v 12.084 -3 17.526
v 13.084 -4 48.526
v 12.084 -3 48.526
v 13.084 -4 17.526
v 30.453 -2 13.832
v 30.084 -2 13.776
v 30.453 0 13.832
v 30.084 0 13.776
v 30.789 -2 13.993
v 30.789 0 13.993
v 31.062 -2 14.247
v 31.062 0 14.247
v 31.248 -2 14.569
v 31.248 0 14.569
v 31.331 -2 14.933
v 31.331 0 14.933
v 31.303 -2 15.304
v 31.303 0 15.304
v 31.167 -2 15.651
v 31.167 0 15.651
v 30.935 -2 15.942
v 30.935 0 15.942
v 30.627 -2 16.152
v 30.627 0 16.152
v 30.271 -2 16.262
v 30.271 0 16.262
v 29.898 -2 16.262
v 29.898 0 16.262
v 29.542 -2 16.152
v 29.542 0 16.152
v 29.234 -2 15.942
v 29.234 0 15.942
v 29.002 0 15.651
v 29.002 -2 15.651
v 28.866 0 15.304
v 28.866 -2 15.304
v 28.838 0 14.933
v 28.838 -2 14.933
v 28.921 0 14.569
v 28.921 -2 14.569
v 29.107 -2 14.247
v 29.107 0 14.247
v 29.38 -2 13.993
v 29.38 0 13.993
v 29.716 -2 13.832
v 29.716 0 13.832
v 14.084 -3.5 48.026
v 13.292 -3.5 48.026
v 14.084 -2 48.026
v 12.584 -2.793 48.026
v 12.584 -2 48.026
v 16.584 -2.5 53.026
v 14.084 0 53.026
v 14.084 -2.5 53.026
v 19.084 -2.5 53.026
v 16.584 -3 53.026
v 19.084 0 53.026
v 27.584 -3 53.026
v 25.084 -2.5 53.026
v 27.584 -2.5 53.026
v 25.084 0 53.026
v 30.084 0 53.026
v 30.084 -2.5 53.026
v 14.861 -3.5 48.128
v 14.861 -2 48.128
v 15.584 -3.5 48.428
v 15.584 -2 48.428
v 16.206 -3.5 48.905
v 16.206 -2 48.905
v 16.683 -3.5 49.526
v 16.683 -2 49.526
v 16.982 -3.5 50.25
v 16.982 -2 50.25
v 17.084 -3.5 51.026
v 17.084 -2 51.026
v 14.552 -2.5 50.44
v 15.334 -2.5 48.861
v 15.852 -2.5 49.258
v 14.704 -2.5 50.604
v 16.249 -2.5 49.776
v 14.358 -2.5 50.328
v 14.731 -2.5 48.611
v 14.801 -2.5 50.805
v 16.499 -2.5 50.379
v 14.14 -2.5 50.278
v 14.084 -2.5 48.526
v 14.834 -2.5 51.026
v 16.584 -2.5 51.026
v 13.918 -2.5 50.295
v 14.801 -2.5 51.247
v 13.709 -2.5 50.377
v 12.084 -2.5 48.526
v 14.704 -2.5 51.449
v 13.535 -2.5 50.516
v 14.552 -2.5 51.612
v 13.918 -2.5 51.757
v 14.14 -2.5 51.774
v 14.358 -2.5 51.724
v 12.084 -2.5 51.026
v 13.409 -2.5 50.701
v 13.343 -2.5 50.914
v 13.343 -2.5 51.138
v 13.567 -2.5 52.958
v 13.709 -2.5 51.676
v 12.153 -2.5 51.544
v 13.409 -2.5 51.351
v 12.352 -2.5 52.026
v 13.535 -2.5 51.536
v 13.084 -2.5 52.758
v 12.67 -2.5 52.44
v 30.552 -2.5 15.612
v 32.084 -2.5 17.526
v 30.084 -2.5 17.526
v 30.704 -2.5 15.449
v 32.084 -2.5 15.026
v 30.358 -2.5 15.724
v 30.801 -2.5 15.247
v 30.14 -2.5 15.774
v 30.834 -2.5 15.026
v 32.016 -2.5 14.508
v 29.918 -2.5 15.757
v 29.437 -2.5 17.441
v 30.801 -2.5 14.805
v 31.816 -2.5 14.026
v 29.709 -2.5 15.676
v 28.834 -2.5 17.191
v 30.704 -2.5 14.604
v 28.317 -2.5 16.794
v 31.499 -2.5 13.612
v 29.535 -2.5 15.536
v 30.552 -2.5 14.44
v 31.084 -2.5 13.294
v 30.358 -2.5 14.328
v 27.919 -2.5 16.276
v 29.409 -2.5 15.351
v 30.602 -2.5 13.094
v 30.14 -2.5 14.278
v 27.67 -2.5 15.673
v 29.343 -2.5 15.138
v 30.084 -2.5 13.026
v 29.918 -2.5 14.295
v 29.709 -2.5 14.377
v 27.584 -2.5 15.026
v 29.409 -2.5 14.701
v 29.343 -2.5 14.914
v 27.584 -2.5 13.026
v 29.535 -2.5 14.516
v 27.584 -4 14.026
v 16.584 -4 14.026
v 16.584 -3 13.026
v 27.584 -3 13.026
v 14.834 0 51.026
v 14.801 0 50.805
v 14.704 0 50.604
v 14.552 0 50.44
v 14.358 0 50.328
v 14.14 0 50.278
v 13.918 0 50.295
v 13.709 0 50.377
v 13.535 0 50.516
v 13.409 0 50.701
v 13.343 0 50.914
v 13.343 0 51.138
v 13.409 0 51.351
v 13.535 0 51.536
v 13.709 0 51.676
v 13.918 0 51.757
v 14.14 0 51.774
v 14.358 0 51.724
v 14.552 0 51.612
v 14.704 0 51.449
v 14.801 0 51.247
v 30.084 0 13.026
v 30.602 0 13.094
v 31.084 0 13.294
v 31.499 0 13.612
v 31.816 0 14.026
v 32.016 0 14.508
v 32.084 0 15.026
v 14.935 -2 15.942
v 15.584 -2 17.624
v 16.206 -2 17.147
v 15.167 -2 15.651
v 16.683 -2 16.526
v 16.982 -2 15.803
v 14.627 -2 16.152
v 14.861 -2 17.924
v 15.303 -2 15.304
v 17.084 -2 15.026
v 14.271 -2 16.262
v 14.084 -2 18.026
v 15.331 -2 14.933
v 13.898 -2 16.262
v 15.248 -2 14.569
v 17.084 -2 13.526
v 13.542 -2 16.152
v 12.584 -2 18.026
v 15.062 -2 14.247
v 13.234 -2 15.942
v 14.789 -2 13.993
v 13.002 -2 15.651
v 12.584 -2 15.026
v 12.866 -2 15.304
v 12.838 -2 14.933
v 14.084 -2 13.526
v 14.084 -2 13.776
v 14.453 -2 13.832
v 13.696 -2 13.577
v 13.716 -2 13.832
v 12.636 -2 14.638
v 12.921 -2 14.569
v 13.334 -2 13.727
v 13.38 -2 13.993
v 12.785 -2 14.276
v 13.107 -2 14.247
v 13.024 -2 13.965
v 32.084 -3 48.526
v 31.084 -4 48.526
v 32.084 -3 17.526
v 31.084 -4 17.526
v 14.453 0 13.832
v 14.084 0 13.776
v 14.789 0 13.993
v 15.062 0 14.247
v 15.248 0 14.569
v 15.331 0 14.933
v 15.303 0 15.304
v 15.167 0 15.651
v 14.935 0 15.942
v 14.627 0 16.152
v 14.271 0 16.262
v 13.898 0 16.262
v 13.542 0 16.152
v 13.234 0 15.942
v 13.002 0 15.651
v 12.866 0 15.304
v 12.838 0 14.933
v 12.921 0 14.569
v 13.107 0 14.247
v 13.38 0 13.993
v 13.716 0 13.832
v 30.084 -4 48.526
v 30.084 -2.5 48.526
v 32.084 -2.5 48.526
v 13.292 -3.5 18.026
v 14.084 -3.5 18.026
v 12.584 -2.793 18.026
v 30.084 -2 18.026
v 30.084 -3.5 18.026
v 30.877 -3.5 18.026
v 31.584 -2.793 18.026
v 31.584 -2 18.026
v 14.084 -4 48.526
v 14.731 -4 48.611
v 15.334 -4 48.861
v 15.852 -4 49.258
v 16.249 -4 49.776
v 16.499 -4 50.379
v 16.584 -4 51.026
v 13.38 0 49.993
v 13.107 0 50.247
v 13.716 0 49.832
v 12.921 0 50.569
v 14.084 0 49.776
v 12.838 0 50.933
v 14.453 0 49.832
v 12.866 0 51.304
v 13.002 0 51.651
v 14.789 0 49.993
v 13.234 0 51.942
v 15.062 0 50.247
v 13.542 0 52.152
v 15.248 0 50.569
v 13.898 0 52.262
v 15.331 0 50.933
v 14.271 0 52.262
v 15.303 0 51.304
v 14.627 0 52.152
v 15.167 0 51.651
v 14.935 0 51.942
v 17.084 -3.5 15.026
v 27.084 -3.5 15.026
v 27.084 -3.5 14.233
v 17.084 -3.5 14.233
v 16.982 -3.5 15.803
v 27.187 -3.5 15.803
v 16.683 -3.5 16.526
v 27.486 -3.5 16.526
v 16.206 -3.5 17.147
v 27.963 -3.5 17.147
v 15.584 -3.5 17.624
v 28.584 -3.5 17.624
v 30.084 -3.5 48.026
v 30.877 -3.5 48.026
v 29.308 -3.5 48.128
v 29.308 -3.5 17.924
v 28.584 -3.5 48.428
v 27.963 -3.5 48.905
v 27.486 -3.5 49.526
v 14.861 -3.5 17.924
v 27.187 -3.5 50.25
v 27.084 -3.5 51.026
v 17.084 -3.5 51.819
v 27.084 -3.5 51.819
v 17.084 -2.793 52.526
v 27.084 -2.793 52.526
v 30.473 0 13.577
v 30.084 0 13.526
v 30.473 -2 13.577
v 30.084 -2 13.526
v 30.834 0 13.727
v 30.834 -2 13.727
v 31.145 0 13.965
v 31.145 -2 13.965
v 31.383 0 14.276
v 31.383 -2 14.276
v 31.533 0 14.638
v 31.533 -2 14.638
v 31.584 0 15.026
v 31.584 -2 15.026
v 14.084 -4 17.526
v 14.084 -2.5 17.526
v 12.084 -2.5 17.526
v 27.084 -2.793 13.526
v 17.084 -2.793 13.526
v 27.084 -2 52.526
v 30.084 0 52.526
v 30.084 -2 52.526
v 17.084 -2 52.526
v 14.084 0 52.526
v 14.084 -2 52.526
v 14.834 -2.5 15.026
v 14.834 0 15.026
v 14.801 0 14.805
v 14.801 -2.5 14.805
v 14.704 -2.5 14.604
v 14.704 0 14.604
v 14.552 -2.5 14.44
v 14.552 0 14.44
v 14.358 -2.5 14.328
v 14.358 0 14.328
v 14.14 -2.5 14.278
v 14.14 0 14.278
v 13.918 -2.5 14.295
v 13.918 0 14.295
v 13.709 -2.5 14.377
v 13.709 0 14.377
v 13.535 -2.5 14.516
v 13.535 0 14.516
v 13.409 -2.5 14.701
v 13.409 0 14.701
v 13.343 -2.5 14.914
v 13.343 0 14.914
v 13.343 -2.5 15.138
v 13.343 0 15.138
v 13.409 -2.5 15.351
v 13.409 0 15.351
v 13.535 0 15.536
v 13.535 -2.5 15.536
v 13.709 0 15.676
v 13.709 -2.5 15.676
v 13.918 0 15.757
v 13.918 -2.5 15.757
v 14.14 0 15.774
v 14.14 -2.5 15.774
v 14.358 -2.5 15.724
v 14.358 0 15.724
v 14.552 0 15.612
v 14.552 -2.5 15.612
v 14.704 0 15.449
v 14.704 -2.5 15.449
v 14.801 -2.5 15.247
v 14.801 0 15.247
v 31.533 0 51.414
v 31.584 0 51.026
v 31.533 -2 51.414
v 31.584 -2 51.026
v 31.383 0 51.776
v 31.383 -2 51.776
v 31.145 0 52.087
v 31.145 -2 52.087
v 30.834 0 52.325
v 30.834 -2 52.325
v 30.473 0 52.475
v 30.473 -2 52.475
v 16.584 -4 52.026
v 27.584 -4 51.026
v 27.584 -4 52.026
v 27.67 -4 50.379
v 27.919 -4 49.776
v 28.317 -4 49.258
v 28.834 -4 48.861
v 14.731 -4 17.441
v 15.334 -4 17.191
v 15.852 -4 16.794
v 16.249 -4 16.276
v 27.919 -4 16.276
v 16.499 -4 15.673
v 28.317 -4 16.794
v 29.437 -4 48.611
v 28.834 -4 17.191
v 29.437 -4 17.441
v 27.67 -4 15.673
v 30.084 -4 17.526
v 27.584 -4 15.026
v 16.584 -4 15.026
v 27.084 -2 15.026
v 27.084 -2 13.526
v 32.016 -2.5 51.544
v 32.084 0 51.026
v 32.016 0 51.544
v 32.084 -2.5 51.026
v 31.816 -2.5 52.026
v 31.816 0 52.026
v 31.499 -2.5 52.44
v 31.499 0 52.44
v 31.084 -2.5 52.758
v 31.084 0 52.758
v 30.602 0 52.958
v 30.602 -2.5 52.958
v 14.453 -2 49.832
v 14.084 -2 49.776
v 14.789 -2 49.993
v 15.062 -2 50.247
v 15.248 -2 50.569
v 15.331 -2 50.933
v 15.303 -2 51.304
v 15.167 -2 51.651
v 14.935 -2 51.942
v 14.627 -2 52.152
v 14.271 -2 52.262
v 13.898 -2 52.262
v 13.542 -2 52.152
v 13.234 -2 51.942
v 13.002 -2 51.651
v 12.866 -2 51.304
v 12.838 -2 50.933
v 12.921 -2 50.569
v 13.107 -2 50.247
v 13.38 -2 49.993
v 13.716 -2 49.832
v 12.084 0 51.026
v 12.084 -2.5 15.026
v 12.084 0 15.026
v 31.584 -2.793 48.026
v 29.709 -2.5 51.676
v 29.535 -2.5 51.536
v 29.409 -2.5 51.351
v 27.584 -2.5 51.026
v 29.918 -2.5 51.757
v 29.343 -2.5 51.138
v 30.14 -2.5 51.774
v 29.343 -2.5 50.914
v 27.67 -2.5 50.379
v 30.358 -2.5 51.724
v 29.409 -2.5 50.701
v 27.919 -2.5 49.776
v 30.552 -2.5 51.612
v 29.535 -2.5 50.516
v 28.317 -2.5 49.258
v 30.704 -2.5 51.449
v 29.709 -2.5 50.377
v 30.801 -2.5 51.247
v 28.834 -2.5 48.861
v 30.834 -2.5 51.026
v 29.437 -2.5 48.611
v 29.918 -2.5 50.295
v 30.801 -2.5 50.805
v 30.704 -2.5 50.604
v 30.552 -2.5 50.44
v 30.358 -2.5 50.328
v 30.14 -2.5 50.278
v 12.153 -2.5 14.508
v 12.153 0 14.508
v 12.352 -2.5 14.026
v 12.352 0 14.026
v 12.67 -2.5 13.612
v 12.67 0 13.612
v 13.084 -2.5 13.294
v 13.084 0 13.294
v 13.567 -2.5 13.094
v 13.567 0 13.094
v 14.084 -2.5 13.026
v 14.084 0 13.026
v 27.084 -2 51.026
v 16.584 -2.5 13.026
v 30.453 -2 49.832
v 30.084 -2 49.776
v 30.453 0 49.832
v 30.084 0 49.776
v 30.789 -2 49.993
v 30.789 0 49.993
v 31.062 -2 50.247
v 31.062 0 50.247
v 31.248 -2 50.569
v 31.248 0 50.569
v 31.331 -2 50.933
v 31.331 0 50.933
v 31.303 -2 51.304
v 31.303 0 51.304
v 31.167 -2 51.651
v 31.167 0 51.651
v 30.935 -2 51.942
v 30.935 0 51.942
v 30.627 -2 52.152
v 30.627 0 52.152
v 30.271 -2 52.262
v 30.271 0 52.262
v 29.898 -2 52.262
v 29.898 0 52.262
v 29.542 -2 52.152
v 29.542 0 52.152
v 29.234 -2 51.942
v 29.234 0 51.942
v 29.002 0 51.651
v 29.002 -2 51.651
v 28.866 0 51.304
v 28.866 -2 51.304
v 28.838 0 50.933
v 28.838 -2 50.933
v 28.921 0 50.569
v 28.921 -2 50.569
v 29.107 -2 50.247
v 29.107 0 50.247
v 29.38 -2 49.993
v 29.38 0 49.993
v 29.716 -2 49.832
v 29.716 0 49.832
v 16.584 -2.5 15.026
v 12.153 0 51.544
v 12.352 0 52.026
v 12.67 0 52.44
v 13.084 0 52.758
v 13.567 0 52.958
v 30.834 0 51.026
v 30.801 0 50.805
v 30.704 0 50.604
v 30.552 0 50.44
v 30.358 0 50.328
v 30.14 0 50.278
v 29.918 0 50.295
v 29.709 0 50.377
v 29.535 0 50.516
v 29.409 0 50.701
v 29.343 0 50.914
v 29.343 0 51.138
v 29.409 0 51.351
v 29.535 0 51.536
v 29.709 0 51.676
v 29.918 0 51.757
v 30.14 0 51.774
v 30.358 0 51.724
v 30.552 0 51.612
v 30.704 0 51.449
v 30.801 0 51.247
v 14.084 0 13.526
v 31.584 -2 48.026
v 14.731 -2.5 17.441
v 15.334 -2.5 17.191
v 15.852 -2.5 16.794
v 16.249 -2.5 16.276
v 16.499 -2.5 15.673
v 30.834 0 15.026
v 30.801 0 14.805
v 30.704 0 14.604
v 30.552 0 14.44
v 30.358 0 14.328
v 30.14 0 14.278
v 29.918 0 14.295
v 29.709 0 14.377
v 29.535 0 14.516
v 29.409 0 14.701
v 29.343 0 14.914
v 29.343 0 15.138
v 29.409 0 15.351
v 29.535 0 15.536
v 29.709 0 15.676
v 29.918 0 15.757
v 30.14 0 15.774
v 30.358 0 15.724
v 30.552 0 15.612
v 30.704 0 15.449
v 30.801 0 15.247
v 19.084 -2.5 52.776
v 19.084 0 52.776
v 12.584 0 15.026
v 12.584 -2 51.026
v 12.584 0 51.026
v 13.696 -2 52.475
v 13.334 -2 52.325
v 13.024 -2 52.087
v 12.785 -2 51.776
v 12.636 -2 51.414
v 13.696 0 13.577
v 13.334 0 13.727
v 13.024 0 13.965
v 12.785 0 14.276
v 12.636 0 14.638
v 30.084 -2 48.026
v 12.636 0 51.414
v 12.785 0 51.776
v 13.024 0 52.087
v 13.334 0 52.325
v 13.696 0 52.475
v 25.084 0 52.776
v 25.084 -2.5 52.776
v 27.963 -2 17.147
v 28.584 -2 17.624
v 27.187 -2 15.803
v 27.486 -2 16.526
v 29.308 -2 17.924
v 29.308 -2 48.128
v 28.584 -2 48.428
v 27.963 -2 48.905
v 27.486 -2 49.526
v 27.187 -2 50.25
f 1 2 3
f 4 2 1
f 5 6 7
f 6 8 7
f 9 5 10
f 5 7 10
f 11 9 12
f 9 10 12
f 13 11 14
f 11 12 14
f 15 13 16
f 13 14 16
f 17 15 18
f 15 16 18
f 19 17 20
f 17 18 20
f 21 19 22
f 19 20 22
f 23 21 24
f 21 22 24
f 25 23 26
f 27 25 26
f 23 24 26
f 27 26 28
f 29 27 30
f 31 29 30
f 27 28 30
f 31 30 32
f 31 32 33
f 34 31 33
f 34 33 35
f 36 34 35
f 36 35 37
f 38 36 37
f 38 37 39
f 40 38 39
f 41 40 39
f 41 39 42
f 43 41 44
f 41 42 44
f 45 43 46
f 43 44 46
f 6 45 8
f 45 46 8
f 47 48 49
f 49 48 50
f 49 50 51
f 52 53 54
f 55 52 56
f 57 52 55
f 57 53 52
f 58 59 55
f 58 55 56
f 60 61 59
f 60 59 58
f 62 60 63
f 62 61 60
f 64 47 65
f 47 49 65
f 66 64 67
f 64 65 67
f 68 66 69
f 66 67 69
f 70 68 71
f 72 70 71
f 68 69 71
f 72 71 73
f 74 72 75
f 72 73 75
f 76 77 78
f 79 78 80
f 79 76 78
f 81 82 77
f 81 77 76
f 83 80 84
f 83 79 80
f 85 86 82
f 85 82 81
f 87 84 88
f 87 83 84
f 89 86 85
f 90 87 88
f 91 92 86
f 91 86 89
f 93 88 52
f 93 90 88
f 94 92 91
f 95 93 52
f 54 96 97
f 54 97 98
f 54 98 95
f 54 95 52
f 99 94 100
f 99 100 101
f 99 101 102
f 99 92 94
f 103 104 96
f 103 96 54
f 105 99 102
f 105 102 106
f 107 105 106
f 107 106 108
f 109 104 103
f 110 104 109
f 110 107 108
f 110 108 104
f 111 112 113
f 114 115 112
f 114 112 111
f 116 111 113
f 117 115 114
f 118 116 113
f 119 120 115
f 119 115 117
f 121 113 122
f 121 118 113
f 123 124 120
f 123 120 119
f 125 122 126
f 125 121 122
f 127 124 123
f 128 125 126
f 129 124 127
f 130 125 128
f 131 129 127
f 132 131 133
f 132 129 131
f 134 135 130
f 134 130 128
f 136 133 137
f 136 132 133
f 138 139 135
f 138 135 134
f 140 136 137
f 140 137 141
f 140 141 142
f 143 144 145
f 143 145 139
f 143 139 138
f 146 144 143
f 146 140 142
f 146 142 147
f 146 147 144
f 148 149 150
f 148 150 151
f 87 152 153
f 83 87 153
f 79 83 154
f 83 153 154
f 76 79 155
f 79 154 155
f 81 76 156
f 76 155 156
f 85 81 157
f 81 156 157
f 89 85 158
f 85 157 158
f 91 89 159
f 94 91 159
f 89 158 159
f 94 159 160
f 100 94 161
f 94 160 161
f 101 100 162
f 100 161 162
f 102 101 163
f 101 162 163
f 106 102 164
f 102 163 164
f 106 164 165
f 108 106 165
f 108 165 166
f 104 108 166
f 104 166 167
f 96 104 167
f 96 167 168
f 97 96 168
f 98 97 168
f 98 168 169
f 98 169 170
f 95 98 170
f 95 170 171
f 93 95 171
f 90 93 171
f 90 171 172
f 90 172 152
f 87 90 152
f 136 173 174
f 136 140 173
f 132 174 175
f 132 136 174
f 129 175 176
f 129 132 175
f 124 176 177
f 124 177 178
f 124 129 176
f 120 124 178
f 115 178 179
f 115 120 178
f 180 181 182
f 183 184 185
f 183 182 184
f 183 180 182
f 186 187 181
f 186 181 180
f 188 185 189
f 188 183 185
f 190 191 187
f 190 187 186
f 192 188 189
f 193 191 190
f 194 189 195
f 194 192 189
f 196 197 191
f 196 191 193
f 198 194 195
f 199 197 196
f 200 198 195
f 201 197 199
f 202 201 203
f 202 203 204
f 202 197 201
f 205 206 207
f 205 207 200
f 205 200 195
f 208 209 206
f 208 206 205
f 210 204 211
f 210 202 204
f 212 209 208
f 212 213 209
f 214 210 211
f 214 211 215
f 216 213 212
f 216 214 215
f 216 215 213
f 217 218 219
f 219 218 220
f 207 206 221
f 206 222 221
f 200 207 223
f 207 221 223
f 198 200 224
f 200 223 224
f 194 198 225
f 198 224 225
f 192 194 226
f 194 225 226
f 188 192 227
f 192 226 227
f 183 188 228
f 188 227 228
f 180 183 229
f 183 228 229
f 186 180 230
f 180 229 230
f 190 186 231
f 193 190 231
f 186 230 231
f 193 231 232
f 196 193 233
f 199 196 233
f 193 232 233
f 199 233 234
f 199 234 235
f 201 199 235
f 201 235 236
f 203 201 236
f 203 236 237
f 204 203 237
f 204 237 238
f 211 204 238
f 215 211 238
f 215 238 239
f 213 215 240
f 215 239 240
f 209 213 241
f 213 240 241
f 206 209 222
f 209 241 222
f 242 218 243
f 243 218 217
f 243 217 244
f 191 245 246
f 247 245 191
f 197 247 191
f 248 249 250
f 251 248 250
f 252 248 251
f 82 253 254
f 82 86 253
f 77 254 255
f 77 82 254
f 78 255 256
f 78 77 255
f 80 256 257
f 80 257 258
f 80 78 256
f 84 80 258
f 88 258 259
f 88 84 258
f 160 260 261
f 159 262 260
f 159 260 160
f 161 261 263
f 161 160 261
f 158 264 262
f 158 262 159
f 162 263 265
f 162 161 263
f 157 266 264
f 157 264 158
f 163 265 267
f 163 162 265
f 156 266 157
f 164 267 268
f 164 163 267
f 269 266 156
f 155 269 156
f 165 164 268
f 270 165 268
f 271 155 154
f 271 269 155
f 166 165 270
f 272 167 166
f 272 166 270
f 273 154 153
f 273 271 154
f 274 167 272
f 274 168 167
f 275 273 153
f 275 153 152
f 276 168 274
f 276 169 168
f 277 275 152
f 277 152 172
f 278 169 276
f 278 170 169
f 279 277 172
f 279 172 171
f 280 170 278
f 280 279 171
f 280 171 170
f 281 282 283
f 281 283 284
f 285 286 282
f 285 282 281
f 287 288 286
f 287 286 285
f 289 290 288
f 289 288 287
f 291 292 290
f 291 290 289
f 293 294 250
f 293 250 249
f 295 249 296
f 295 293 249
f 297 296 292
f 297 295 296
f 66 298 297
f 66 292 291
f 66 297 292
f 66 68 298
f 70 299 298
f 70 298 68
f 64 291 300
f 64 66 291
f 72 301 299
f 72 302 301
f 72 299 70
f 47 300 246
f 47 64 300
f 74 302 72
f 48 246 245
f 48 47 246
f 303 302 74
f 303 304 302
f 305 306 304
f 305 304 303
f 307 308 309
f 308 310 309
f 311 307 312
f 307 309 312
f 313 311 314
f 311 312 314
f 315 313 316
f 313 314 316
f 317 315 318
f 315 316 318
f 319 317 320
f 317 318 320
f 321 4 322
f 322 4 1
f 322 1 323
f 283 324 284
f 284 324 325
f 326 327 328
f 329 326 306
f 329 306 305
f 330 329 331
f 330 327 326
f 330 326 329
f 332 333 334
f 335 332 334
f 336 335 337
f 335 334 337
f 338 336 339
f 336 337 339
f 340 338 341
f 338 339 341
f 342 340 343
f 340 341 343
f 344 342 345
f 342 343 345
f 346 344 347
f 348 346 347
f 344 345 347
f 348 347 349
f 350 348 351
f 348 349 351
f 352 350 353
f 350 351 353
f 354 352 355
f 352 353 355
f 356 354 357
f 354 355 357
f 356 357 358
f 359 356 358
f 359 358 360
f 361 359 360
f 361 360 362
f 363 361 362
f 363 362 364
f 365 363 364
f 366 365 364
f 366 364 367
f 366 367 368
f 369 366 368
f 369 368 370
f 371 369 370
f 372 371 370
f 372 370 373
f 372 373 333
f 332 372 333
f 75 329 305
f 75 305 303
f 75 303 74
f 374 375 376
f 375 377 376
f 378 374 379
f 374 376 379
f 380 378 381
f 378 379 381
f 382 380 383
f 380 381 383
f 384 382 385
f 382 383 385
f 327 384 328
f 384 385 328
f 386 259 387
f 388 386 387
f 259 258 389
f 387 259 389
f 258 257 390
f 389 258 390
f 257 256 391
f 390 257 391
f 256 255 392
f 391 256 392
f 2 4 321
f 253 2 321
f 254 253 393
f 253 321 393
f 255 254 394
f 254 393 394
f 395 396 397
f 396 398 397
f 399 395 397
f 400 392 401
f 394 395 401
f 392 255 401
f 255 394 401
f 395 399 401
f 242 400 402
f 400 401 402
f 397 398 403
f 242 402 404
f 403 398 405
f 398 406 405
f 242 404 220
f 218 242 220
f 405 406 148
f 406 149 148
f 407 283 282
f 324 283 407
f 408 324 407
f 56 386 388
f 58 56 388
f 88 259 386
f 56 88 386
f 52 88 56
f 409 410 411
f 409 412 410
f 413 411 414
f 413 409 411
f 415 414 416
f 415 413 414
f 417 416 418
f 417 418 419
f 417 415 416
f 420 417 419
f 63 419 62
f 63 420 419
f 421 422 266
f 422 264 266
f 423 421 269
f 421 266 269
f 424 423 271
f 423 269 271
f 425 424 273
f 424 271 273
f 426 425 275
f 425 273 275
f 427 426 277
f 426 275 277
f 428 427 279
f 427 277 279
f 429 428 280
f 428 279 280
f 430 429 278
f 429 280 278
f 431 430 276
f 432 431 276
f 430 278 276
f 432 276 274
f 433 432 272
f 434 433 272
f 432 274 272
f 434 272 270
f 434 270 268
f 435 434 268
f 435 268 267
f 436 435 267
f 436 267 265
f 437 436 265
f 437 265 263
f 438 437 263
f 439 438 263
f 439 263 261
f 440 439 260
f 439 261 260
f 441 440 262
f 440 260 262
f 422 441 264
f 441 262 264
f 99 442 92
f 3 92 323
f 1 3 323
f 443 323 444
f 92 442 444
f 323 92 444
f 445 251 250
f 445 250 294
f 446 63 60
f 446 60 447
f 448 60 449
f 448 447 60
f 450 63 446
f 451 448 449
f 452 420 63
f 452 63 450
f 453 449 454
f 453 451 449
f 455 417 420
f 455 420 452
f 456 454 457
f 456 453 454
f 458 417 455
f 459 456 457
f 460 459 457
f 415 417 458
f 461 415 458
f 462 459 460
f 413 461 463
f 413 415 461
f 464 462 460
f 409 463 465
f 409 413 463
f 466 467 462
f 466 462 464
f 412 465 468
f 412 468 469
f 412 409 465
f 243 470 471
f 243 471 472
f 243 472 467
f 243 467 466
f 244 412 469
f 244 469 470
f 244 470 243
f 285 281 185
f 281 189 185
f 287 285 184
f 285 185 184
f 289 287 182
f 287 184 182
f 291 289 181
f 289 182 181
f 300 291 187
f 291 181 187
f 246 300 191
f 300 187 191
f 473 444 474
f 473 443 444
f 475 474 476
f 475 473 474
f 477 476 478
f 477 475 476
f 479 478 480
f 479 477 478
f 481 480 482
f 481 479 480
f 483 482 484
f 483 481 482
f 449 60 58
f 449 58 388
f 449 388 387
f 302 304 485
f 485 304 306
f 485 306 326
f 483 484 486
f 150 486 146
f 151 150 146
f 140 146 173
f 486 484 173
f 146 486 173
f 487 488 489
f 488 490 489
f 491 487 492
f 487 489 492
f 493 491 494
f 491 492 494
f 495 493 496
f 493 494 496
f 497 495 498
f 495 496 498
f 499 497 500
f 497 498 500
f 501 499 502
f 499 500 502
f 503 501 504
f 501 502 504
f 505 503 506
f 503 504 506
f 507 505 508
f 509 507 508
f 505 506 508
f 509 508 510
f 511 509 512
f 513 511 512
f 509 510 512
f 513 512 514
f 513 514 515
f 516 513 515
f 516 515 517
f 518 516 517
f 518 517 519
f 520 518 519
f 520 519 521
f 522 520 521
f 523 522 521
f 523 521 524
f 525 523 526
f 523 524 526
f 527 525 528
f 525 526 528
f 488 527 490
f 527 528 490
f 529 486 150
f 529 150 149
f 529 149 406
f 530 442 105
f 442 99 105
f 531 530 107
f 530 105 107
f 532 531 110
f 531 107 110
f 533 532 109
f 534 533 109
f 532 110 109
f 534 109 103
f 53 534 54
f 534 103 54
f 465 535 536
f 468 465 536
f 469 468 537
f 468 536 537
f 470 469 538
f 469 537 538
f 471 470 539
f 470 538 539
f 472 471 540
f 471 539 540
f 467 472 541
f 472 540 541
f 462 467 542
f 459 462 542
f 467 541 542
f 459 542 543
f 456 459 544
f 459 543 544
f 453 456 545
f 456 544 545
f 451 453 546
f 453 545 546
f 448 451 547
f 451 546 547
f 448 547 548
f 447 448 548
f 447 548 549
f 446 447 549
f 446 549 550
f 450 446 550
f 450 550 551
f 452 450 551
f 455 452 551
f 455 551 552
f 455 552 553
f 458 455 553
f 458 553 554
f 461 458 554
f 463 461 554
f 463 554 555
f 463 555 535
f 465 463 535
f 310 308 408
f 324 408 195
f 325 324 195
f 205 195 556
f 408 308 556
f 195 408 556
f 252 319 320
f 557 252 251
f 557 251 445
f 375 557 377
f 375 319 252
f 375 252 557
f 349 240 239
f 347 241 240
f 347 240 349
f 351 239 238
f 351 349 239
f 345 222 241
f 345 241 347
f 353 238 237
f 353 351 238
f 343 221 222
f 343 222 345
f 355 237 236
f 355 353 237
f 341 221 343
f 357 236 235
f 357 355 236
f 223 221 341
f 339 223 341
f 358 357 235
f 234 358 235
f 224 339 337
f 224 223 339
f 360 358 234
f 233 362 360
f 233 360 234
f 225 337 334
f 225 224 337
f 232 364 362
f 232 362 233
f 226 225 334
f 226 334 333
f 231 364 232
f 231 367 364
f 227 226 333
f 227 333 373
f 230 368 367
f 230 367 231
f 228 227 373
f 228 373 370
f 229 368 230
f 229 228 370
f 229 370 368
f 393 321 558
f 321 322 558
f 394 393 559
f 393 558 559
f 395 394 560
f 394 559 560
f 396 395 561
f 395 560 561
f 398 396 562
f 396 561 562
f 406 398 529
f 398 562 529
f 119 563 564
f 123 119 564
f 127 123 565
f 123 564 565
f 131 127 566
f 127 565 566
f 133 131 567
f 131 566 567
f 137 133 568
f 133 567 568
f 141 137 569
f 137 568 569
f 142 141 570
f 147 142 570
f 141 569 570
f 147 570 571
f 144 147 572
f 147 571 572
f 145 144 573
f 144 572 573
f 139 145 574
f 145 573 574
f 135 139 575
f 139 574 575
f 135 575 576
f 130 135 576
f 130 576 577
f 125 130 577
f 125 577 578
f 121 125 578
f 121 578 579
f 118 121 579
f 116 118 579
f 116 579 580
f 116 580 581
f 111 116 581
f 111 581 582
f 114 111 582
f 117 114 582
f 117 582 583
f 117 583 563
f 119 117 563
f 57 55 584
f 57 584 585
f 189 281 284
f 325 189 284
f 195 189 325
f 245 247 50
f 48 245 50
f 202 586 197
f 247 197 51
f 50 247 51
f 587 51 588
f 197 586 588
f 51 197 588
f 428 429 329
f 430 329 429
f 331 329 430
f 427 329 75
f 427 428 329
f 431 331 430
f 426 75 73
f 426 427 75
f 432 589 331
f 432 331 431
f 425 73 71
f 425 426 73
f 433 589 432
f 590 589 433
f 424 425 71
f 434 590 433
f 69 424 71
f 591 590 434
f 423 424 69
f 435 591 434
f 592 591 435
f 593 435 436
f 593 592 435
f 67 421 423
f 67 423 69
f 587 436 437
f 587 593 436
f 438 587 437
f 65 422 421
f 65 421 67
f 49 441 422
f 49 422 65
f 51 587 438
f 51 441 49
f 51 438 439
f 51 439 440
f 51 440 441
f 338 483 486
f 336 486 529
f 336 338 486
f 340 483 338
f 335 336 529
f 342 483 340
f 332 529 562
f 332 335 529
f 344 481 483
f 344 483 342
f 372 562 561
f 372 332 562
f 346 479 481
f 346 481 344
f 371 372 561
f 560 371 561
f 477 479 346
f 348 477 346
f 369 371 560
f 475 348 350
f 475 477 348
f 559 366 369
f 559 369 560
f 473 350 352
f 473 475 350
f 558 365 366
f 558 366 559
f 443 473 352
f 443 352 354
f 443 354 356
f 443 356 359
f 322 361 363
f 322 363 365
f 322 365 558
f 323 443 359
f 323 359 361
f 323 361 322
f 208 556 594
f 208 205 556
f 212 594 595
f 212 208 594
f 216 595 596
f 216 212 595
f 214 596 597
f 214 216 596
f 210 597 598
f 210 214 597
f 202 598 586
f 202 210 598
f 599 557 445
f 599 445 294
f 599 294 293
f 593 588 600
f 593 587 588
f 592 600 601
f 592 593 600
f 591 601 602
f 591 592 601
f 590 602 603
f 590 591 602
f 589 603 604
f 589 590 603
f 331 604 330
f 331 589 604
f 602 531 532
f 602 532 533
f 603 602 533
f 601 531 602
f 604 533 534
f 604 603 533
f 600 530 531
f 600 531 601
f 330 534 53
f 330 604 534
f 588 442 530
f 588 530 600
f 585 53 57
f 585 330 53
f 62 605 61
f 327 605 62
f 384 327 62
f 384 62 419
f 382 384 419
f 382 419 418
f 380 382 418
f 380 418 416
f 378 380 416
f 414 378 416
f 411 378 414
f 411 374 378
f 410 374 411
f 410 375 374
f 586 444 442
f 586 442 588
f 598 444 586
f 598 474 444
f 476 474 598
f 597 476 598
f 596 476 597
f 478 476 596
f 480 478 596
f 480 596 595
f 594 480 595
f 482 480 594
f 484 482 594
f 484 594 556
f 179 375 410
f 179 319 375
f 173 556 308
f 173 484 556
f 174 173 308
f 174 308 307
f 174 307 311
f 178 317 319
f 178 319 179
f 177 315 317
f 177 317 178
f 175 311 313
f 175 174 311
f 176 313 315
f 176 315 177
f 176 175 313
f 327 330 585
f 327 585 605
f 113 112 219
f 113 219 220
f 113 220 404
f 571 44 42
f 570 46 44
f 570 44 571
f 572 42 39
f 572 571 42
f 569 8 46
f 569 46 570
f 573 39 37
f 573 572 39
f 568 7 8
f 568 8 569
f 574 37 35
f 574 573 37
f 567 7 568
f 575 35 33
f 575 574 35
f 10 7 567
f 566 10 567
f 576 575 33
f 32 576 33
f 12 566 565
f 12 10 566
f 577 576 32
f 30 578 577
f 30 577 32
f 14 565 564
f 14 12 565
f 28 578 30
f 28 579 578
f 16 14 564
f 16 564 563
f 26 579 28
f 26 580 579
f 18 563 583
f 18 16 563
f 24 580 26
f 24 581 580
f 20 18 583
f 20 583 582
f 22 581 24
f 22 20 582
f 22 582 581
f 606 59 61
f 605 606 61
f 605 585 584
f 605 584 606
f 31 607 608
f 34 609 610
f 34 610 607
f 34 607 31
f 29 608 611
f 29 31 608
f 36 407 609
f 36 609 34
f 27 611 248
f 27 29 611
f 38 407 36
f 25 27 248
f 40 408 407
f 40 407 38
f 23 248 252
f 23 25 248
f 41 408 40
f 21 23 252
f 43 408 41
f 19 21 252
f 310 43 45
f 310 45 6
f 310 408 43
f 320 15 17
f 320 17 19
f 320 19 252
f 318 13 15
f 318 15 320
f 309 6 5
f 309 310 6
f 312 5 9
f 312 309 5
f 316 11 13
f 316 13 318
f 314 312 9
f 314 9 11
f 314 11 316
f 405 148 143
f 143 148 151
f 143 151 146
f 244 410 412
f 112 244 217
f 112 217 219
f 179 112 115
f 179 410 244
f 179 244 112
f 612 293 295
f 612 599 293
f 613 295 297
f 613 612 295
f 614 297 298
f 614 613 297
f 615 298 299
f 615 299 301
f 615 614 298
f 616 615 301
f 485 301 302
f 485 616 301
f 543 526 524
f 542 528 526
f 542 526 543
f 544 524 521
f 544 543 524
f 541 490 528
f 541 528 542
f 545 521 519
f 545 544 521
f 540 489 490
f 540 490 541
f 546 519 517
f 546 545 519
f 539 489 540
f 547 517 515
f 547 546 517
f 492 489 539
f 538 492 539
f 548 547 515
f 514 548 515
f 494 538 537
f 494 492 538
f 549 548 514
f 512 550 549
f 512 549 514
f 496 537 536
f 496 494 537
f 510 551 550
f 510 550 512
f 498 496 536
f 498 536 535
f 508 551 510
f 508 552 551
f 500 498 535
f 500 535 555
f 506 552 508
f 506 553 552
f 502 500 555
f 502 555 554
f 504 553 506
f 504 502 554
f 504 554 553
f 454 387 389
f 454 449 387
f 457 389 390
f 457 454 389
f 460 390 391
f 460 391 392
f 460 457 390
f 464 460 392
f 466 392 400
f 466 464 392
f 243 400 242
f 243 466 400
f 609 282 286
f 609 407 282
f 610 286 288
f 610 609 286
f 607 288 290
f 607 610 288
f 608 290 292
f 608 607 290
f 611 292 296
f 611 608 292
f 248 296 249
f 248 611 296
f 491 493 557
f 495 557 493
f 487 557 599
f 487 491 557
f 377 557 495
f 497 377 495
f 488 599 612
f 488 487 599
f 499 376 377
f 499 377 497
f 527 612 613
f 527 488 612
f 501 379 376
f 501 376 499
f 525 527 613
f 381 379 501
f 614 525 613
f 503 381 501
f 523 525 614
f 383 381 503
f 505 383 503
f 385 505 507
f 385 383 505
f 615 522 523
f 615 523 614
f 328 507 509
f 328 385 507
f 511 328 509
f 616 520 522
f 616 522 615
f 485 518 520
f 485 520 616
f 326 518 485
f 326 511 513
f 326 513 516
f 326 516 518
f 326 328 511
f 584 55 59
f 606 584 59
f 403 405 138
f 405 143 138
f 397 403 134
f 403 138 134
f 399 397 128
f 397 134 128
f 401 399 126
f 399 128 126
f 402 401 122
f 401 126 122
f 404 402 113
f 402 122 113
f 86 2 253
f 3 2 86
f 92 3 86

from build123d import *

# Parameters (mm, degrees)
ESQUISSE1_W                     = 20
ESQUISSE1_H                     = 40
BOSS_EXTRU_1_DEPTH              = 4
ESQUISSE2_W                     = 19
ESQUISSE2_H                     = 39
ENL_V_MAT_EXTRU_1_DEPTH         = 3.5
ESQUISSE3_W                     = 4.5
ESQUISSE3_H                     = 1.5
BOSS_EXTRU_2_DEPTH              = 4.5
ESQUISSE4_W                     = 4.5
ESQUISSE4_H                     = 1.5
BOSS_EXTRU_3_DEPTH              = 4.5
ESQUISSE5_W                     = 4.5
ESQUISSE5_H                     = 1.5
BOSS_EXTRU_4_DEPTH              = 4.5
ESQUISSE6_W                     = 4.5
ESQUISSE6_H                     = 1.5
BOSS_EXTRU_5_DEPTH              = 4.5
ESQUISSE7_W                     = 4.5
ESQUISSE7_H                     = 1.5
ENL_V_MAT_EXTRU_2_DEPTH         = 4.5
ESQUISSE8_W                     = 4.5
ESQUISSE8_H                     = 1.5
ENL_V_MAT_EXTRU_3_DEPTH         = 4.5
ESQUISSE9_W                     = 4.5
ESQUISSE9_H                     = 1.5
ENL_V_MAT_EXTRU_4_DEPTH         = 4.5
ESQUISSE10_W                    = 4.5
ESQUISSE10_H                    = 1.5
ENL_V_MAT_EXTRU_5_DEPTH         = 4.5
ESQUISSE11_W                    = 6
ESQUISSE11_H                    = 2.5
ENL_V_MAT_EXTRU_6_DEPTH         = 0.25
ESQUISSE12_W                    = 1.25
ESQUISSE12_H                    = 2
ESQUISSE13_W                    = 1.25
ESQUISSE13_H                    = 2
ESQUISSE14_W                    = 1.25
ESQUISSE14_H                    = 2
ESQUISSE15_W                    = 1.25
ESQUISSE15_H                    = 2
DIAM_TRE_DU_PER_AGE_1_5_1_5_1_D = 1.5
CHANFREIN1_SIZE                 = 0.707106781
CHANFREIN2_SIZE                 = 1
CONG_1_R                        = 1.5
CONG_2_R                        = 2
CONG_3_R                        = 2.5
CONG_4_R                        = 3


with BuildPart() as part:
    # Esquisse1 → Boss.-Extru.1 (new body)
    with BuildSketch(Plane(origin=(0, 0, 0), x_dir=(1, 0, 0), z_dir=(0, 1, 0))):
        with Locations((22.084435946, -33.026080306)):
            Rectangle(ESQUISSE1_W, ESQUISSE1_H)
    extrude(amount=-BOSS_EXTRU_1_DEPTH)

    # Esquisse2 → Enlèv. mat.-Extru.1 (cut)
    with BuildSketch(Plane(origin=(0, 0, 0), x_dir=(-1, 0, 0), z_dir=(0, 1, 0))):
        with Locations((-22.084435946, 33.026080306)):
            Rectangle(ESQUISSE2_W, ESQUISSE2_H)
    extrude(amount=-ENL_V_MAT_EXTRU_1_DEPTH, mode=Mode.SUBTRACT)

    # Esquisse3 → Boss.-Extru.2 (add)
    with BuildSketch(Plane(origin=(12.584435946, 0, 0), x_dir=(0, 0, -1), z_dir=(1, 0, 0))):
        with Locations((-15.776080306, -2.75)):
            Rectangle(ESQUISSE3_W, ESQUISSE3_H)
    extrude(amount=BOSS_EXTRU_2_DEPTH)

    # Esquisse4 → Boss.-Extru.3 (add)
    with BuildSketch(Plane.XY.offset(13.526080306)):
        with Locations((29.334435946, -2.75)):
            Rectangle(ESQUISSE4_W, ESQUISSE4_H)
    extrude(amount=BOSS_EXTRU_3_DEPTH)

    # Esquisse5 → Boss.-Extru.4 (add)
    with BuildSketch(Plane(origin=(12.584435946, 0, 0), x_dir=(0, 0, -1), z_dir=(1, 0, 0))):
        with Locations((-50.276080306, -2.75)):
            Rectangle(ESQUISSE5_W, ESQUISSE5_H)
    extrude(amount=BOSS_EXTRU_4_DEPTH)

    # Esquisse6 → Boss.-Extru.5 (add)
    with BuildSketch(Plane(origin=(0, 0, 52.526080306), x_dir=(-1, 0, 0), z_dir=(0, 0, -1))):
        with Locations((-29.334435946, -2.75)):
            Rectangle(ESQUISSE6_W, ESQUISSE6_H)
    extrude(amount=BOSS_EXTRU_5_DEPTH)

    # Esquisse7 → Enlèv. mat.-Extru.2 (cut)
    with BuildSketch(Plane.ZY.offset(-12.084435946)):
        with Locations((15.276080306, -3.25)):
            Rectangle(ESQUISSE7_W, ESQUISSE7_H)
    extrude(amount=-ENL_V_MAT_EXTRU_2_DEPTH, mode=Mode.SUBTRACT)

    # Esquisse8 → Enlèv. mat.-Extru.3 (cut)
    with BuildSketch(Plane(origin=(0, 0, 13.026080306), x_dir=(-1, 0, 0), z_dir=(0, 0, -1))):
        with Locations((-29.834435946, -3.25)):
            Rectangle(ESQUISSE8_W, ESQUISSE8_H)
    extrude(amount=-ENL_V_MAT_EXTRU_3_DEPTH, mode=Mode.SUBTRACT)

    # Esquisse9 → Enlèv. mat.-Extru.4 (cut)
    with BuildSketch(Plane.ZY.offset(-12.084435946)):
        with Locations((50.776080306, -3.25)):
            Rectangle(ESQUISSE9_W, ESQUISSE9_H)
    extrude(amount=-ENL_V_MAT_EXTRU_4_DEPTH, mode=Mode.SUBTRACT)

    # Esquisse10 → Enlèv. mat.-Extru.5 (cut)
    with BuildSketch(Plane(origin=(32.084435946, 0, 0), x_dir=(0, 0, -1), z_dir=(1, 0, 0))):
        with Locations((-50.776080306, -3.25)):
            Rectangle(ESQUISSE10_W, ESQUISSE10_H)
    extrude(amount=-ENL_V_MAT_EXTRU_5_DEPTH, mode=Mode.SUBTRACT)

    # Esquisse11 → Enlèv. mat.-Extru.6 (cut)
    with BuildSketch(Plane.XY.offset(53.026080306)):
        with Locations((22.084435946, -1.25)):
            Rectangle(ESQUISSE11_W, ESQUISSE11_H)
    extrude(amount=-ENL_V_MAT_EXTRU_6_DEPTH, mode=Mode.SUBTRACT)

    # Esquisse12 → Révolution1 (revolve)
    with BuildSketch(Plane.XY.offset(15.026080306)):
        with Locations((30.709435946, -1)):
            Rectangle(ESQUISSE12_W, ESQUISSE12_H)
    revolve(axis=Axis((30.084435946, 0, 15.026080306), (0, -1, 0)))

    # Esquisse13 → Révolution2 (revolve)
    with BuildSketch(Plane.XY.offset(15.026080306)):
        with Locations((14.709435946, -1)):
            Rectangle(ESQUISSE13_W, ESQUISSE13_H)
    revolve(axis=Axis((14.084435946, 0, 15.026080306), (0, -1, 0)))

    # Esquisse14 → Révolution3 (revolve)
    with BuildSketch(Plane.XY.offset(51.026080306)):
        with Locations((14.709435946, -1)):
            Rectangle(ESQUISSE14_W, ESQUISSE14_H)
    revolve(axis=Axis((14.084435946, 0, 51.026080306), (0, -1, 0)))

    # Esquisse15 → Révolution4 (revolve)
    with BuildSketch(Plane.XY.offset(51.026080306)):
        with Locations((30.709435946, -1)):
            Rectangle(ESQUISSE15_W, ESQUISSE15_H)
    revolve(axis=Axis((30.084435946, 0, 51.026080306), (0, -1, 0)))

    # Diamètre du perçage Ø1.5 (1.5)1 (through all)
    with Locations(Plane(origin=(0, -2.5, 0), x_dir=(-1, 0, 0), z_dir=(0, -1, 0))):
        with Locations((-30.084435946, -51.026080306), (-14.084435946, -51.026080306), (-14.084435946, -15.026080306), (-30.084435946, -15.026080306)):
            Hole(DIAM_TRE_DU_PER_AGE_1_5_1_5_1_D / 2)

    # Chanfrein1
    chanfrein1_edges = [part.edges().sort_by_distance(p)[0] for p in [
        (12.584435946, -3.5, 33.026080306),
        (22.084435946, -3.5, 52.526080306),
        (22.084435946, -3.5, 13.526080306),
        (31.584435946, -3.5, 33.026080306),
    ]]
    chamfer(chanfrein1_edges, length=CHANFREIN1_SIZE)

    # Chanfrein2
    chanfrein2_edges = [part.edges().sort_by_distance(p)[0] for p in [
        (12.084435946, -4, 33.026080306),
        (22.084435946, -4, 53.026080306),
        (22.084435946, -4, 13.026080306),
        (32.084435946, -4, 33.026080306),
    ]]
    chamfer(chanfrein2_edges, length=CHANFREIN2_SIZE)

    # Congé1
    cong_1_edges = [part.edges().sort_by_distance(p)[0] for p in [
        (12.584435946, -1, 13.526080306),
        (31.584435946, -1, 13.526080306),
        (31.584435946, -1, 52.526080306),
        (12.584435946, -1, 52.526080306),
    ]]
    fillet(cong_1_edges, radius=CONG_1_R)

    # Congé2
    cong_2_edges = [part.edges().sort_by_distance(p)[0] for p in [
        (12.084435946, -1.25, 53.026080306),
        (32.084435946, -1.25, 53.026080306),
        (32.084435946, -1.25, 13.026080306),
        (12.084435946, -1.25, 13.026080306),
    ]]
    fillet(cong_2_edges, radius=CONG_2_R)

    # Congé3
    cong_3_edges = [part.edges().sort_by_distance(p)[0] for p in [
        (16.584435946, -3.25, 17.526080306),
        (27.584435946, -3.25, 48.526080306),
        (16.584435946, -3.25, 48.526080306),
        (27.584435946, -3.25, 17.526080306),
    ]]
    fillet(cong_3_edges, radius=CONG_3_R)

    # Congé4
    cong_4_edges = [part.edges().sort_by_distance(p)[0] for p in [
        (17.084435946, -2.75, 18.026080306),
        (17.084435946, -2.75, 48.026080306),
        (27.084435946, -2.75, 18.026080306),
        (27.084435946, -2.75, 48.026080306),
    ]]
    fillet(cong_4_edges, radius=CONG_4_R)


solid = part.part
